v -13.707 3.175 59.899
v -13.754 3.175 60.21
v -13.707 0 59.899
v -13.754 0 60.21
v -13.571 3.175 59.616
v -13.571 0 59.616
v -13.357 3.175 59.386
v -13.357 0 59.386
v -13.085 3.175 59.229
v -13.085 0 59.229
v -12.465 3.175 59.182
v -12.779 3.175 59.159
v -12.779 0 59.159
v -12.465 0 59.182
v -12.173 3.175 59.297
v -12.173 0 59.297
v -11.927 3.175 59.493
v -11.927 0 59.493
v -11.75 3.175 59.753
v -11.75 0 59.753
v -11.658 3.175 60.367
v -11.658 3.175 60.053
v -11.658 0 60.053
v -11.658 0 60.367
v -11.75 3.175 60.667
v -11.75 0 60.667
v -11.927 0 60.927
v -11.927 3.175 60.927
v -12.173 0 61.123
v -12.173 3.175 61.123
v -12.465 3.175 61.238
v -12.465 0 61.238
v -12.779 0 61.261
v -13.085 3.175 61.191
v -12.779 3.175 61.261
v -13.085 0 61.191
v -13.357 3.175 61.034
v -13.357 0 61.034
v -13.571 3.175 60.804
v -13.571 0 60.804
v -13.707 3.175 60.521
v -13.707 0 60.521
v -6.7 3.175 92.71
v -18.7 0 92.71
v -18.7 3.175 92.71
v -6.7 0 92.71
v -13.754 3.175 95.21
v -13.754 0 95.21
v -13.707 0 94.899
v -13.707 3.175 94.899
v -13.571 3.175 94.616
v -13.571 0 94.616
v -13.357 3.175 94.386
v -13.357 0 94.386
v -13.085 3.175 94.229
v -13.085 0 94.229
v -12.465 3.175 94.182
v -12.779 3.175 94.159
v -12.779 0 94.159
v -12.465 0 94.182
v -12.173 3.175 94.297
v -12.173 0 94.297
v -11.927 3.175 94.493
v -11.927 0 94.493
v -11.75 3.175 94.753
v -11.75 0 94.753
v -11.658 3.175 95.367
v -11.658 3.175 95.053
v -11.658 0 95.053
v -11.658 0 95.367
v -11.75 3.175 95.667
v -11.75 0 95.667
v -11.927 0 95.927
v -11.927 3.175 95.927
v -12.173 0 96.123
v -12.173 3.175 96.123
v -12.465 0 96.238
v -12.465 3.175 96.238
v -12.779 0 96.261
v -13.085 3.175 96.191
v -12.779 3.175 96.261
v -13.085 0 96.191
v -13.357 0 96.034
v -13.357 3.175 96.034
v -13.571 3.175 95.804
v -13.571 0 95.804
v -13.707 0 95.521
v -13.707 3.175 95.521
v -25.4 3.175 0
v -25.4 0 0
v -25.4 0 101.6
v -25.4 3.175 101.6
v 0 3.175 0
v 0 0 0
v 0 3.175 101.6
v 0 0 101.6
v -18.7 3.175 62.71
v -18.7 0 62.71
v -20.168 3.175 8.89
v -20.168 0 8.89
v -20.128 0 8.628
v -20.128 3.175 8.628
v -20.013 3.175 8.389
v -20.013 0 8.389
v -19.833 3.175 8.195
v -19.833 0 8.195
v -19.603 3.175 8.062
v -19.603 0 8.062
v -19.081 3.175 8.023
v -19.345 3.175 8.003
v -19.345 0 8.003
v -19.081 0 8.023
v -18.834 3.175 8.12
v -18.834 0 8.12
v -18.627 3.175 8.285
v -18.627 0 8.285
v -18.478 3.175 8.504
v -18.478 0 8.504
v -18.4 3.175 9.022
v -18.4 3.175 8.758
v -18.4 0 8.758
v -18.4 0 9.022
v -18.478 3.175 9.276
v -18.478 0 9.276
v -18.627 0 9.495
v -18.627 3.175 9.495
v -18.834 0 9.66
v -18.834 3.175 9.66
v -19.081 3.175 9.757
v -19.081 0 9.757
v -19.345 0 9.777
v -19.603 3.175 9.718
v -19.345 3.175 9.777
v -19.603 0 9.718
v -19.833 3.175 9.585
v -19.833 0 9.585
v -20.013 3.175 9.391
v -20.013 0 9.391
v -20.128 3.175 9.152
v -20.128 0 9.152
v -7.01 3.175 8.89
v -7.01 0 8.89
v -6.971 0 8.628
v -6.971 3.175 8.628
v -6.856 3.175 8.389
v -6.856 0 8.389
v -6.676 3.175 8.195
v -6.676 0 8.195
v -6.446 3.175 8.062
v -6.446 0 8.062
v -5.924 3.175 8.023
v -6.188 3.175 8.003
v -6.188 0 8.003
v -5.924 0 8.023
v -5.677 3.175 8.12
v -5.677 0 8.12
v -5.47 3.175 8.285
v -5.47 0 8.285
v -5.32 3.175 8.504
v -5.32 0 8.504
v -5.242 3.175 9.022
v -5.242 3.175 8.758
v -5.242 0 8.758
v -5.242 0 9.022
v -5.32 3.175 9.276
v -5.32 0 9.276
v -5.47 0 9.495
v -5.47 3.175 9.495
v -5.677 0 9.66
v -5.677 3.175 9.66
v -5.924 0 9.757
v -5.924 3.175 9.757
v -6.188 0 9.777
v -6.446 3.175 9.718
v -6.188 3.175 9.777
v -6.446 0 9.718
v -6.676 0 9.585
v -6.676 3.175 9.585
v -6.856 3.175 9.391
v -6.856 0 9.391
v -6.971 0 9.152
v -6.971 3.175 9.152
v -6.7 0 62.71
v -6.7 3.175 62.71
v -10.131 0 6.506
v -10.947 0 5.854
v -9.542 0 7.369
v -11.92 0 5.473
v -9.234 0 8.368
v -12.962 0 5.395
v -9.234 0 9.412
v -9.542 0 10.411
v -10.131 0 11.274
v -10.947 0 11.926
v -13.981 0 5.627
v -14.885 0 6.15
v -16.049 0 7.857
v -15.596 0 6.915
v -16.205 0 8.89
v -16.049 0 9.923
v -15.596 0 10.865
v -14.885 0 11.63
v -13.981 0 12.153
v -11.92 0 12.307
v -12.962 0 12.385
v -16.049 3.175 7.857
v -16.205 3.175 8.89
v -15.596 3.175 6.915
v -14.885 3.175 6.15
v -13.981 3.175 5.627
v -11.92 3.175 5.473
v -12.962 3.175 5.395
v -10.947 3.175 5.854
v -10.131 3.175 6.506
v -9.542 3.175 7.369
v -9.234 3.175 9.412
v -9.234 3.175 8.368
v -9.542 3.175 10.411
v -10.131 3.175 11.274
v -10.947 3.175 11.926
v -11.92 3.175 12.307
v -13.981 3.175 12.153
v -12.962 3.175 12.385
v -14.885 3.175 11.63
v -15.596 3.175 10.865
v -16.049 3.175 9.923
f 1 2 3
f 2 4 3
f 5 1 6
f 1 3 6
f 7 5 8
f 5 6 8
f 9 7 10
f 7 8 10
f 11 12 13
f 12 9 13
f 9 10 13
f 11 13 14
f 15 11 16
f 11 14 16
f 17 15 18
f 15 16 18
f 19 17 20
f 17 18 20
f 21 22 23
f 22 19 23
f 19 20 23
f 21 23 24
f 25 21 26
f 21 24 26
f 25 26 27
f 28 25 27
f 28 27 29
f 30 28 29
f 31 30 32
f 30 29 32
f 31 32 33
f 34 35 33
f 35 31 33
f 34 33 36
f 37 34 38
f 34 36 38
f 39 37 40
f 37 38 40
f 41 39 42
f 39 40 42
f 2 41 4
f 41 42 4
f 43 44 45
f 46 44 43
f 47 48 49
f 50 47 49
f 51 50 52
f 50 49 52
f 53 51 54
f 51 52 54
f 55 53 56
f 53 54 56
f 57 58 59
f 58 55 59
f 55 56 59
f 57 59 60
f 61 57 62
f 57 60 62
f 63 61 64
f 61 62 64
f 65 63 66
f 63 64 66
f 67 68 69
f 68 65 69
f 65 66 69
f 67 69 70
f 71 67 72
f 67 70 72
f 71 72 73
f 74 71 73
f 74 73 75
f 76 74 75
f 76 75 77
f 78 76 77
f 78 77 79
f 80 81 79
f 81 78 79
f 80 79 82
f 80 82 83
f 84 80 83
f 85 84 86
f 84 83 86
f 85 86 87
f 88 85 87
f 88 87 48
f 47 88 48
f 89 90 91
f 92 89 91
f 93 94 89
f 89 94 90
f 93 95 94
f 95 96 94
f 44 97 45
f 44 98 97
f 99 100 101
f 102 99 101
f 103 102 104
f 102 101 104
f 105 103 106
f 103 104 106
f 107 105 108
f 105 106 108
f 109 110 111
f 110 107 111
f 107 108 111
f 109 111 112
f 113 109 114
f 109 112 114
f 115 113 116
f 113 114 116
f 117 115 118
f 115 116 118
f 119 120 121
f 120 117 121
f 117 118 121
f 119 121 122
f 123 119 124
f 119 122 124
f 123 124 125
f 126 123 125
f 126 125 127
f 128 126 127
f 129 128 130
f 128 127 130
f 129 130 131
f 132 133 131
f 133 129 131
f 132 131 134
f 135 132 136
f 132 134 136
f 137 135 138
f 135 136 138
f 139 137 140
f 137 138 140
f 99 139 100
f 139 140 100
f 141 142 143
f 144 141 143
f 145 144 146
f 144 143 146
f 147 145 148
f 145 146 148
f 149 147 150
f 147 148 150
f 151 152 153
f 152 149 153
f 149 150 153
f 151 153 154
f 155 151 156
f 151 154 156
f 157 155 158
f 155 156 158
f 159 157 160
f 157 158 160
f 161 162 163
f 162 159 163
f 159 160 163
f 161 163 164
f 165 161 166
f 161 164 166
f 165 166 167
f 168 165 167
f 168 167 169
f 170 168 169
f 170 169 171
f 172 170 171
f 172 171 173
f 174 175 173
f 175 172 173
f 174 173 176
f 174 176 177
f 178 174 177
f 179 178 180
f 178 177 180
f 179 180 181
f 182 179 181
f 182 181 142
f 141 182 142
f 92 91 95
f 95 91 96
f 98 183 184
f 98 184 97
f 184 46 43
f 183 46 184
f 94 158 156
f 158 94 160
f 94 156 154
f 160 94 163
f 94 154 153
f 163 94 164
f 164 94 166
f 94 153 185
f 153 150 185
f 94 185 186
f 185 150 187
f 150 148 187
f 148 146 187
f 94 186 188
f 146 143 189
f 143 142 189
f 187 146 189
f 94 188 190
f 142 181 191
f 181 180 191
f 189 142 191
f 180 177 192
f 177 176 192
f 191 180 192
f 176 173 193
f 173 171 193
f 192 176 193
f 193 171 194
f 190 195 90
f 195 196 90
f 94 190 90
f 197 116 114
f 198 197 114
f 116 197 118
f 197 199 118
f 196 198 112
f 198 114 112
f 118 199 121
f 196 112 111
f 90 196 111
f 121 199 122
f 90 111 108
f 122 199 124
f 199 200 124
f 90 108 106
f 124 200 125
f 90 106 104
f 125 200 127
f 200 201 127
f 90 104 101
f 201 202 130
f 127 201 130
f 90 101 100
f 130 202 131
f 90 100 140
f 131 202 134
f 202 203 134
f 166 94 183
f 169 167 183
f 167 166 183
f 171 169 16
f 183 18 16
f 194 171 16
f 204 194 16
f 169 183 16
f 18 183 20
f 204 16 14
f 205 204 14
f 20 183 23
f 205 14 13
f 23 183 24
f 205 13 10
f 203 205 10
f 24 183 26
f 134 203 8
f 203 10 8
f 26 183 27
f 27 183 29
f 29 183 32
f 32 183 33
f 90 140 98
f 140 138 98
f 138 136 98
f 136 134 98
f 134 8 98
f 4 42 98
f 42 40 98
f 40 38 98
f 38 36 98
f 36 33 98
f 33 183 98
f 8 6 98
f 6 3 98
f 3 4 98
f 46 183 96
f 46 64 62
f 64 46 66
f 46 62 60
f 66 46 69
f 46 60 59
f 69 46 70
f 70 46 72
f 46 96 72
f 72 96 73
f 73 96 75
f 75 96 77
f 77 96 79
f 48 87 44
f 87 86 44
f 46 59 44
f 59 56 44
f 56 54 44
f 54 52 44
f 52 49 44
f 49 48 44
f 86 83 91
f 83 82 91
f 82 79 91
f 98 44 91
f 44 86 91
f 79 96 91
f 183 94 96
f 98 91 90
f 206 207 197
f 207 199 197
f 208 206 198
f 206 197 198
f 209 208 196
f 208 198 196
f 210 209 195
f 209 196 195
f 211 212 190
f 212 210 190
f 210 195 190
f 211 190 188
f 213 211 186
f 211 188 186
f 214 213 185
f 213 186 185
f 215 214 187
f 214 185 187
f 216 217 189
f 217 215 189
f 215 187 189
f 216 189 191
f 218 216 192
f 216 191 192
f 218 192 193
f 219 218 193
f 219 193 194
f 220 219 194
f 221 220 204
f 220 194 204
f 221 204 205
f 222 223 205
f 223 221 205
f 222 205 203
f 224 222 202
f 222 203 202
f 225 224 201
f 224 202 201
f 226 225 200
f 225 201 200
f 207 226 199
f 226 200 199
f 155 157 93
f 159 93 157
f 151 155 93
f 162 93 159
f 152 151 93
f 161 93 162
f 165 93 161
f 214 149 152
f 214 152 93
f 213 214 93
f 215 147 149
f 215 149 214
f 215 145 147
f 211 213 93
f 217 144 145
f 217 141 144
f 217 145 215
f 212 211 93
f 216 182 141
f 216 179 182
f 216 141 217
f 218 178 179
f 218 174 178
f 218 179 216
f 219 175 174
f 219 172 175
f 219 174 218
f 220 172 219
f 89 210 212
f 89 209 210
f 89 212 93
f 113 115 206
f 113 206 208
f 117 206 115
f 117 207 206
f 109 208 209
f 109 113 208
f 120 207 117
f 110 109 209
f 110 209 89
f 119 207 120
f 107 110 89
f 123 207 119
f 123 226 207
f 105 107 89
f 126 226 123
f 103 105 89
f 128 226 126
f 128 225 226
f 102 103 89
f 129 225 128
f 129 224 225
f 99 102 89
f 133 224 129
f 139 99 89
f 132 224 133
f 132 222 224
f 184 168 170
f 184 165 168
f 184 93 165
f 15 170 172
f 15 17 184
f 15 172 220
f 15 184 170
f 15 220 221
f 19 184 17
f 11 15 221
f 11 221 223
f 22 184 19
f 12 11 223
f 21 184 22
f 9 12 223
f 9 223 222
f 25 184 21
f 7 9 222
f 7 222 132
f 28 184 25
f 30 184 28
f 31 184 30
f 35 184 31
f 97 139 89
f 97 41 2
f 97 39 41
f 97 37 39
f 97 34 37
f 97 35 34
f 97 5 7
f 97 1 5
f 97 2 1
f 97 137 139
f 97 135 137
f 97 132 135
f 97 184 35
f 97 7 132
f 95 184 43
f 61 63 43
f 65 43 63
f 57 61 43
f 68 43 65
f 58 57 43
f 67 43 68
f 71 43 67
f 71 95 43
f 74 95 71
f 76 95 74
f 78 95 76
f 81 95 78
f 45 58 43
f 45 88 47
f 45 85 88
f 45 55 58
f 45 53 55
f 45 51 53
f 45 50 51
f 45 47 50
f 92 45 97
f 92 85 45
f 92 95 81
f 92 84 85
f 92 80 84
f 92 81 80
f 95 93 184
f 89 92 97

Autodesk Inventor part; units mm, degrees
ref_plane "YZ Plane" through (0, 0, 0) normal (1, 0, 0) x (0, 1, 0)
ref_plane "XZ Plane" through (0, 0, 0) normal (0, 1, 0) x (-1, 0, 0)
ref_plane "XY Plane" through (0, 0, 0) normal (0, 0, 1) x (1, 0, 0)
sketch "Sketch1" plane through (0, 0, 0) normal (0, 1, 0) x (-1, 0, 0)
  line L0 (0, 0) -> (25.4, 0)
  line L1 (25.4, 0) -> (25.4, 101.6)
  line L2 (25.4, 101.6) -> (0, 101.6)
  line L3 (0, 101.6) -> (0, 0)
  circle A0 centre (12.7, 8.89) radius 3.5052
  circle A1 centre (6.1214, 8.89) radius 0.889
  circle A2 centre (19.2786, 8.89) radius 0.889
  line L4 (6.7, 62.71) -> (18.7, 62.71)
  line L5 (18.7, 62.71) -> (18.7, 92.71)
  line L6 (18.7, 92.71) -> (6.7, 92.71)
  line L7 (6.7, 92.71) -> (6.7, 62.71)
  circle A3 centre (12.7, 95.21) radius 1.0541
  circle A4 centre (12.7, 60.21) radius 1.0541
  dimension "d0" = 25.4
  dimension "d1" = 101.6
  dimension "d2" = 7.0104
  dimension "d3" = 8.89
  dimension "d4" = 12.7
  dimension "d5" = 1.778
  dimension "d6" = 1.778
  dimension "d7" = 13.1572
  dimension "d8" = 6.5786
  dimension "d9" = 8.89
  dimension "d10" = 8.89
  dimension "d11" = 12
  dimension "d12" = 30
  dimension "d13" = 8.89
  dimension "d14" = 6.7
  dimension "d15" = 2.1082
  dimension "d16" = 2.1082
  dimension "d17" = 6
  dimension "d18" = 6
  dimension "d19" = 35
  dimension "d20" = 2.5
extrude "Extrusion1" add sketch "Sketch1" along normal blind 3.175
equation "\"d0\" = armWidth"
equation "\"d1\" = armLength"
equation "\"d2\" = hornCenter"
equation "\"d3\" = hornOffset"
equation "\"d4\" = 0.5 * armWidth"
equation "\"d5\" = hornHole"
equation "\"d6\" = hornHole"
equation "\"d7\" = hornDia"
equation "\"d8\" = 0.5 * hornDia"
equation "\"d9\" = hornOffset"
equation "\"d10\" = hornOffset"
equation "\"d11\" = servoWidth"
equation "\"d12\" = servoLength"
equation "\"d13\" = servoOff"
equation "\"d14\" = -0.5 * servoWidth + 0.5 * armWidth"
equation "\"d15\" = servoHole"
equation "\"d16\" = servoHole"
equation "\"d17\" = 0.5 * servoWidth"
equation "\"d18\" = 0.5 * servoWidth"
equation "\"d19\" = servoDist"
equation "\"d20\" = -0.5 * servoLength + 0.5 * servoDist"
equation "\"d21\" = thick"
equation "\"thick\" = 3.175"
equation "\"hornCenter\" = 7.0104"
equation "\"hornDia\" = 13.1572"
equation "\"hornOffset\" = 8.89"
equation "\"hornHole\" = 1.778"
equation "\"servoLength\" = 30"
equation "\"servoWidth\" = 12"
equation "\"servoDist\" = 35"
equation "\"servoHole\" = 2.1082"
equation "\"servoOff\" = 8.89"
equation "\"armWidth\" = 25.4"
equation "\"armLength\" = 101.6"
properties part number "UpperArm"
